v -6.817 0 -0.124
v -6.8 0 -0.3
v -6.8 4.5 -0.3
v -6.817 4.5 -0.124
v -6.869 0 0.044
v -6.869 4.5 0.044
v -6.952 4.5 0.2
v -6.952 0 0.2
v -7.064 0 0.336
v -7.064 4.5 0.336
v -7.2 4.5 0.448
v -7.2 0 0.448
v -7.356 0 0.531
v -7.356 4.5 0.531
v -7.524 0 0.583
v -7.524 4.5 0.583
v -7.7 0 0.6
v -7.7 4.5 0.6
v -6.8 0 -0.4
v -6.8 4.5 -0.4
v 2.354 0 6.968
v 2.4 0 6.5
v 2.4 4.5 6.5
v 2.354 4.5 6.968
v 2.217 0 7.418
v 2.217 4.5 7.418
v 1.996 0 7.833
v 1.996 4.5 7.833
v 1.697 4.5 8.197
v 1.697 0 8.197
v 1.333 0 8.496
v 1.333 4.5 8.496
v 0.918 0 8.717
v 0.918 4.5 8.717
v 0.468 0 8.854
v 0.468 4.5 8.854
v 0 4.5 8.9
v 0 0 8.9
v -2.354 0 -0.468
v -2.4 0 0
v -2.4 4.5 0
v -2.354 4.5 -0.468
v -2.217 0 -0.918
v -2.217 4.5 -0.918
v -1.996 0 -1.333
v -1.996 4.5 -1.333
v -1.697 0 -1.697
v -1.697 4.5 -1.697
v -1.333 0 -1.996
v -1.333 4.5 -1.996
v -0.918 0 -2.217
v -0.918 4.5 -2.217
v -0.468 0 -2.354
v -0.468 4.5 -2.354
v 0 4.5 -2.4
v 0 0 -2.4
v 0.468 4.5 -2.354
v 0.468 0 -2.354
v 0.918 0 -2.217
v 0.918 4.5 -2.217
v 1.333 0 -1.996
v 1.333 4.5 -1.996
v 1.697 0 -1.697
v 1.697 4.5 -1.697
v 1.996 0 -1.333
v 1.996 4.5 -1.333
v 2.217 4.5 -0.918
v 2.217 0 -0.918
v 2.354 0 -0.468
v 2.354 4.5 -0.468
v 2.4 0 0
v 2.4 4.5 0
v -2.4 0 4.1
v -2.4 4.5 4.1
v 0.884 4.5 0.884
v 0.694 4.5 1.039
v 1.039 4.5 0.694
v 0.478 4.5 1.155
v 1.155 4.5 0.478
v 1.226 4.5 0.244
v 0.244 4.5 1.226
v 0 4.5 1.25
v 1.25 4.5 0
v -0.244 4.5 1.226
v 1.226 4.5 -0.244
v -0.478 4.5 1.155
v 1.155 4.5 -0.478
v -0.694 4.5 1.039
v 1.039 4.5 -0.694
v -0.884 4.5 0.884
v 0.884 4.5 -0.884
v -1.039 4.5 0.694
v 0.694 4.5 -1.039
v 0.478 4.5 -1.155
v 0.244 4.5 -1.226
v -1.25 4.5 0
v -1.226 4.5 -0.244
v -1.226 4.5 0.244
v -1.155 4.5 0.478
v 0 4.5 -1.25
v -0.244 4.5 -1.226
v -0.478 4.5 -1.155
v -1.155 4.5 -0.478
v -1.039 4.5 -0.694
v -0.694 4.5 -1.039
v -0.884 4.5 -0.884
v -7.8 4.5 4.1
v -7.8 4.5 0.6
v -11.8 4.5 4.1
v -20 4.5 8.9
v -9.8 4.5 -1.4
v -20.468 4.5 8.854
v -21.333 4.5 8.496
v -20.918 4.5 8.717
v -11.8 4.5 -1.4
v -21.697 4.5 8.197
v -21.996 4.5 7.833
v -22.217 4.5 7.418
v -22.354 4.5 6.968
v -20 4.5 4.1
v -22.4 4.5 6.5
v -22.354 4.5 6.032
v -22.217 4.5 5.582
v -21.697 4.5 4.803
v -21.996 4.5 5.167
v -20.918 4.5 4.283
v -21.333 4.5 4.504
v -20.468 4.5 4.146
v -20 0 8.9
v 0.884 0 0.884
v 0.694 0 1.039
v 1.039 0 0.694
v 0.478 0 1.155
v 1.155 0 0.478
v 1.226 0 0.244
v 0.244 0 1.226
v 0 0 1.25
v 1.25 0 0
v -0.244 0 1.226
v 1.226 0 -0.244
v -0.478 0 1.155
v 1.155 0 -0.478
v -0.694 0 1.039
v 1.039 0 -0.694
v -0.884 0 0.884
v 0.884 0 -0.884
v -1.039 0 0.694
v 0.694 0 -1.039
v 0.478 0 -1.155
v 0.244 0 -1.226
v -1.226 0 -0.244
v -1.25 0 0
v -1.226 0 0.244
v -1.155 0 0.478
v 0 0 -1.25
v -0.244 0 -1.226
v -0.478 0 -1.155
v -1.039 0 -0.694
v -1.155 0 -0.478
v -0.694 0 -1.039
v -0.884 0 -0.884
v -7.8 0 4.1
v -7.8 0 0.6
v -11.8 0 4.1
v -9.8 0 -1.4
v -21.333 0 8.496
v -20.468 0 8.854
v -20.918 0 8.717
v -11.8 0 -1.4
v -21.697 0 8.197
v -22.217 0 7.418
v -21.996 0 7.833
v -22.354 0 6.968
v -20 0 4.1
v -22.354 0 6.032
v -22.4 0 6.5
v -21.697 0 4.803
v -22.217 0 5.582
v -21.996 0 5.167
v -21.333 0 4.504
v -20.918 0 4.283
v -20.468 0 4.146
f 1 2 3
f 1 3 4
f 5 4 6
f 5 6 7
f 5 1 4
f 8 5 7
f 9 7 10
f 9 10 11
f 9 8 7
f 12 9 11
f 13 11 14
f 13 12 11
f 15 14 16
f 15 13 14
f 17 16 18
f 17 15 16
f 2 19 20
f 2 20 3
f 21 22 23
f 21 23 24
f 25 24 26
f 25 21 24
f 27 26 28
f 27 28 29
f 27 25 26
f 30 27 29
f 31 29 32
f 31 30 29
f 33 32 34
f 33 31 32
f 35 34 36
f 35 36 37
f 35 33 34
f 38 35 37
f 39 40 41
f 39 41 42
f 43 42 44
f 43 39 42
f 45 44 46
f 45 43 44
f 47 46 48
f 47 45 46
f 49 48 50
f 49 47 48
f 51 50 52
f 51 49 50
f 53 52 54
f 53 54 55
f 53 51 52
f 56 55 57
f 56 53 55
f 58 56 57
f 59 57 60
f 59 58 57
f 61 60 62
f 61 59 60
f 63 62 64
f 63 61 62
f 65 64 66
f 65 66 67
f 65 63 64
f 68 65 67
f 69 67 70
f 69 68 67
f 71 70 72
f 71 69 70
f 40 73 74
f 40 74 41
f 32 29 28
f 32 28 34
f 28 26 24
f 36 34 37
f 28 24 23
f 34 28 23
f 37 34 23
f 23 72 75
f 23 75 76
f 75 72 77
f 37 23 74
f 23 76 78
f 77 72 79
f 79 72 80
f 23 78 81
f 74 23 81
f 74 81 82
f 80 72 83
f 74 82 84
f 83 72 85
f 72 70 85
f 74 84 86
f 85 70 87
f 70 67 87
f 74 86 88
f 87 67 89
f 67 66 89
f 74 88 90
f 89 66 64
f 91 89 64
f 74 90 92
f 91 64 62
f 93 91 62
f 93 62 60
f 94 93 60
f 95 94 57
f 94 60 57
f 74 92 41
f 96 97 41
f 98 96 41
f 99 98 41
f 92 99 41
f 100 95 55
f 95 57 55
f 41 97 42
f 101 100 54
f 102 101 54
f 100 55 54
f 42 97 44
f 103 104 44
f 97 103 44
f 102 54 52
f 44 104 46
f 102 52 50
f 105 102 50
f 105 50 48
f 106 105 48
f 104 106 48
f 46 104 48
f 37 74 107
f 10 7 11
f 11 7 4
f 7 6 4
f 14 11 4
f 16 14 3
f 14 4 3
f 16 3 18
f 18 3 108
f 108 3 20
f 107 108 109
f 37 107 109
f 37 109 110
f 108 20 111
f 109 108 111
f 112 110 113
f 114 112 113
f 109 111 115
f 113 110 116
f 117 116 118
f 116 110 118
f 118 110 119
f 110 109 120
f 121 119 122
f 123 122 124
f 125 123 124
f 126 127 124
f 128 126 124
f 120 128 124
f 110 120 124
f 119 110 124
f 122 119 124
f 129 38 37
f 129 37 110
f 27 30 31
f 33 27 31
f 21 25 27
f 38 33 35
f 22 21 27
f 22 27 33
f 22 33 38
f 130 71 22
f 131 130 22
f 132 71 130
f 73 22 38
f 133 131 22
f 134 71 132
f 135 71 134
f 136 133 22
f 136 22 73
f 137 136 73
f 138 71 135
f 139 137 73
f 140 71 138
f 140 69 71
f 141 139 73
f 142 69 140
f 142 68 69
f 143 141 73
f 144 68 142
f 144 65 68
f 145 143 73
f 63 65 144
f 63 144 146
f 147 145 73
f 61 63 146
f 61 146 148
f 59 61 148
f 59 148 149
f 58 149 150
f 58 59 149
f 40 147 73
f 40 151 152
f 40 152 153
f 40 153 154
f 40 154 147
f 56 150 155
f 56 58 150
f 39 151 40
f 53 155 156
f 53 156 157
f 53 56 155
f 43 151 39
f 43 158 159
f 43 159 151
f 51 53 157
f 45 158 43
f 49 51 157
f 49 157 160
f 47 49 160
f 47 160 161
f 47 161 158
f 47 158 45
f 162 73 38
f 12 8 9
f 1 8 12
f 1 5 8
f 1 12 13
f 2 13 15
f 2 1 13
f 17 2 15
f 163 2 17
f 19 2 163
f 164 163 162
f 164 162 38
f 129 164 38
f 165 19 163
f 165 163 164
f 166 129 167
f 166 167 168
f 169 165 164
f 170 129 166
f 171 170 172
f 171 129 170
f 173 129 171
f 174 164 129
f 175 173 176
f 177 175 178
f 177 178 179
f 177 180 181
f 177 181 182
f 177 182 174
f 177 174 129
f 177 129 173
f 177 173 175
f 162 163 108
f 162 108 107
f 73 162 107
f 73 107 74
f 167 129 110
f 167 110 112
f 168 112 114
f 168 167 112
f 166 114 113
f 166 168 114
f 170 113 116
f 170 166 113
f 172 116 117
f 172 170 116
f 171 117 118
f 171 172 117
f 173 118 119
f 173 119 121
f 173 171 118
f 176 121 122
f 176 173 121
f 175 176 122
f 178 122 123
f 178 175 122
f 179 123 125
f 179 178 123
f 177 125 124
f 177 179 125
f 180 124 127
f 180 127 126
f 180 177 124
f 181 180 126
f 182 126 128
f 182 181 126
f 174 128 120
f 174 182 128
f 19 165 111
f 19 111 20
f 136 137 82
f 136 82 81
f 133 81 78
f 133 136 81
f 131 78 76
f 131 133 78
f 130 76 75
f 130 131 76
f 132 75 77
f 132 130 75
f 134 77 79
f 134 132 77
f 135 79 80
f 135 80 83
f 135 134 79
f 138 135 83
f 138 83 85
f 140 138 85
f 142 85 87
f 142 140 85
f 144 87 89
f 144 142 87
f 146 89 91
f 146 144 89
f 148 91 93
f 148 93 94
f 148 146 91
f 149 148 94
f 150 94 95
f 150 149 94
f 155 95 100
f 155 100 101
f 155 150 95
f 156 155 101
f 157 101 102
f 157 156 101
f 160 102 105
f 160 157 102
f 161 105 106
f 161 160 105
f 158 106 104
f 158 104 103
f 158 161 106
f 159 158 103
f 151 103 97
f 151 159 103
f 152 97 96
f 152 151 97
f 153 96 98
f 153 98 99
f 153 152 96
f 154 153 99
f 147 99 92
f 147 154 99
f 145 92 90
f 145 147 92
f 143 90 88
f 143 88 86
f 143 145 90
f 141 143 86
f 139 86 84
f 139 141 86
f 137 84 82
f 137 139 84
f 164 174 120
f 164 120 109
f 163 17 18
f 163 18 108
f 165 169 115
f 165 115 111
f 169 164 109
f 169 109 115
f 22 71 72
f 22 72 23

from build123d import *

# Parameters (mm, degrees)
SKETCH1_R           = 1.25
BOSS_EXTRUDE1_DEPTH = 4.5


with BuildPart() as part:
    # Sketch1 → Boss-Extrude1 (new body)
    with BuildSketch(Plane(origin=(0, 0, 0), x_dir=(1, 0, 0), z_dir=(0, 1, 0))):
        with BuildLine():
            Line((2.4, 0), (2.4, -6.5))
            ThreePointArc((2.4, -6.5), (1.697056275, -8.197056275), (0, -8.9))
            Line((0, -8.9), (-20, -8.9))
            ThreePointArc((-20, -8.9), (-22.4, -6.5), (-20, -4.1))
            Line((-20, -4.1), (-11.8, -4.1))
            Line((-11.8, -4.1), (-11.8, 1.4))
            Line((-11.8, 1.4), (-9.8, 1.4))
            Line((-9.8, 1.4), (-6.8, 0.4))
            Line((-6.8, 0.4), (-6.8, 0.3))
            ThreePointArc((-6.8, 0.3), (-7.063603897, -0.336396103), (-7.7, -0.6))
            Line((-7.7, -0.6), (-7.8, -0.6))
            Line((-7.8, -0.6), (-7.8, -4.1))
            Line((-7.8, -4.1), (-2.4, -4.1))
            Line((-2.4, -4.1), (-2.4, 0))
            ThreePointArc((-2.4, 0), (0, 2.4), (2.4, 0))
        make_face()
        with Locations(Location((0, 0, 0), (0, 0, 270))):
            Circle(SKETCH1_R, mode=Mode.SUBTRACT)
    extrude(amount=BOSS_EXTRUDE1_DEPTH)


solid = part.part
